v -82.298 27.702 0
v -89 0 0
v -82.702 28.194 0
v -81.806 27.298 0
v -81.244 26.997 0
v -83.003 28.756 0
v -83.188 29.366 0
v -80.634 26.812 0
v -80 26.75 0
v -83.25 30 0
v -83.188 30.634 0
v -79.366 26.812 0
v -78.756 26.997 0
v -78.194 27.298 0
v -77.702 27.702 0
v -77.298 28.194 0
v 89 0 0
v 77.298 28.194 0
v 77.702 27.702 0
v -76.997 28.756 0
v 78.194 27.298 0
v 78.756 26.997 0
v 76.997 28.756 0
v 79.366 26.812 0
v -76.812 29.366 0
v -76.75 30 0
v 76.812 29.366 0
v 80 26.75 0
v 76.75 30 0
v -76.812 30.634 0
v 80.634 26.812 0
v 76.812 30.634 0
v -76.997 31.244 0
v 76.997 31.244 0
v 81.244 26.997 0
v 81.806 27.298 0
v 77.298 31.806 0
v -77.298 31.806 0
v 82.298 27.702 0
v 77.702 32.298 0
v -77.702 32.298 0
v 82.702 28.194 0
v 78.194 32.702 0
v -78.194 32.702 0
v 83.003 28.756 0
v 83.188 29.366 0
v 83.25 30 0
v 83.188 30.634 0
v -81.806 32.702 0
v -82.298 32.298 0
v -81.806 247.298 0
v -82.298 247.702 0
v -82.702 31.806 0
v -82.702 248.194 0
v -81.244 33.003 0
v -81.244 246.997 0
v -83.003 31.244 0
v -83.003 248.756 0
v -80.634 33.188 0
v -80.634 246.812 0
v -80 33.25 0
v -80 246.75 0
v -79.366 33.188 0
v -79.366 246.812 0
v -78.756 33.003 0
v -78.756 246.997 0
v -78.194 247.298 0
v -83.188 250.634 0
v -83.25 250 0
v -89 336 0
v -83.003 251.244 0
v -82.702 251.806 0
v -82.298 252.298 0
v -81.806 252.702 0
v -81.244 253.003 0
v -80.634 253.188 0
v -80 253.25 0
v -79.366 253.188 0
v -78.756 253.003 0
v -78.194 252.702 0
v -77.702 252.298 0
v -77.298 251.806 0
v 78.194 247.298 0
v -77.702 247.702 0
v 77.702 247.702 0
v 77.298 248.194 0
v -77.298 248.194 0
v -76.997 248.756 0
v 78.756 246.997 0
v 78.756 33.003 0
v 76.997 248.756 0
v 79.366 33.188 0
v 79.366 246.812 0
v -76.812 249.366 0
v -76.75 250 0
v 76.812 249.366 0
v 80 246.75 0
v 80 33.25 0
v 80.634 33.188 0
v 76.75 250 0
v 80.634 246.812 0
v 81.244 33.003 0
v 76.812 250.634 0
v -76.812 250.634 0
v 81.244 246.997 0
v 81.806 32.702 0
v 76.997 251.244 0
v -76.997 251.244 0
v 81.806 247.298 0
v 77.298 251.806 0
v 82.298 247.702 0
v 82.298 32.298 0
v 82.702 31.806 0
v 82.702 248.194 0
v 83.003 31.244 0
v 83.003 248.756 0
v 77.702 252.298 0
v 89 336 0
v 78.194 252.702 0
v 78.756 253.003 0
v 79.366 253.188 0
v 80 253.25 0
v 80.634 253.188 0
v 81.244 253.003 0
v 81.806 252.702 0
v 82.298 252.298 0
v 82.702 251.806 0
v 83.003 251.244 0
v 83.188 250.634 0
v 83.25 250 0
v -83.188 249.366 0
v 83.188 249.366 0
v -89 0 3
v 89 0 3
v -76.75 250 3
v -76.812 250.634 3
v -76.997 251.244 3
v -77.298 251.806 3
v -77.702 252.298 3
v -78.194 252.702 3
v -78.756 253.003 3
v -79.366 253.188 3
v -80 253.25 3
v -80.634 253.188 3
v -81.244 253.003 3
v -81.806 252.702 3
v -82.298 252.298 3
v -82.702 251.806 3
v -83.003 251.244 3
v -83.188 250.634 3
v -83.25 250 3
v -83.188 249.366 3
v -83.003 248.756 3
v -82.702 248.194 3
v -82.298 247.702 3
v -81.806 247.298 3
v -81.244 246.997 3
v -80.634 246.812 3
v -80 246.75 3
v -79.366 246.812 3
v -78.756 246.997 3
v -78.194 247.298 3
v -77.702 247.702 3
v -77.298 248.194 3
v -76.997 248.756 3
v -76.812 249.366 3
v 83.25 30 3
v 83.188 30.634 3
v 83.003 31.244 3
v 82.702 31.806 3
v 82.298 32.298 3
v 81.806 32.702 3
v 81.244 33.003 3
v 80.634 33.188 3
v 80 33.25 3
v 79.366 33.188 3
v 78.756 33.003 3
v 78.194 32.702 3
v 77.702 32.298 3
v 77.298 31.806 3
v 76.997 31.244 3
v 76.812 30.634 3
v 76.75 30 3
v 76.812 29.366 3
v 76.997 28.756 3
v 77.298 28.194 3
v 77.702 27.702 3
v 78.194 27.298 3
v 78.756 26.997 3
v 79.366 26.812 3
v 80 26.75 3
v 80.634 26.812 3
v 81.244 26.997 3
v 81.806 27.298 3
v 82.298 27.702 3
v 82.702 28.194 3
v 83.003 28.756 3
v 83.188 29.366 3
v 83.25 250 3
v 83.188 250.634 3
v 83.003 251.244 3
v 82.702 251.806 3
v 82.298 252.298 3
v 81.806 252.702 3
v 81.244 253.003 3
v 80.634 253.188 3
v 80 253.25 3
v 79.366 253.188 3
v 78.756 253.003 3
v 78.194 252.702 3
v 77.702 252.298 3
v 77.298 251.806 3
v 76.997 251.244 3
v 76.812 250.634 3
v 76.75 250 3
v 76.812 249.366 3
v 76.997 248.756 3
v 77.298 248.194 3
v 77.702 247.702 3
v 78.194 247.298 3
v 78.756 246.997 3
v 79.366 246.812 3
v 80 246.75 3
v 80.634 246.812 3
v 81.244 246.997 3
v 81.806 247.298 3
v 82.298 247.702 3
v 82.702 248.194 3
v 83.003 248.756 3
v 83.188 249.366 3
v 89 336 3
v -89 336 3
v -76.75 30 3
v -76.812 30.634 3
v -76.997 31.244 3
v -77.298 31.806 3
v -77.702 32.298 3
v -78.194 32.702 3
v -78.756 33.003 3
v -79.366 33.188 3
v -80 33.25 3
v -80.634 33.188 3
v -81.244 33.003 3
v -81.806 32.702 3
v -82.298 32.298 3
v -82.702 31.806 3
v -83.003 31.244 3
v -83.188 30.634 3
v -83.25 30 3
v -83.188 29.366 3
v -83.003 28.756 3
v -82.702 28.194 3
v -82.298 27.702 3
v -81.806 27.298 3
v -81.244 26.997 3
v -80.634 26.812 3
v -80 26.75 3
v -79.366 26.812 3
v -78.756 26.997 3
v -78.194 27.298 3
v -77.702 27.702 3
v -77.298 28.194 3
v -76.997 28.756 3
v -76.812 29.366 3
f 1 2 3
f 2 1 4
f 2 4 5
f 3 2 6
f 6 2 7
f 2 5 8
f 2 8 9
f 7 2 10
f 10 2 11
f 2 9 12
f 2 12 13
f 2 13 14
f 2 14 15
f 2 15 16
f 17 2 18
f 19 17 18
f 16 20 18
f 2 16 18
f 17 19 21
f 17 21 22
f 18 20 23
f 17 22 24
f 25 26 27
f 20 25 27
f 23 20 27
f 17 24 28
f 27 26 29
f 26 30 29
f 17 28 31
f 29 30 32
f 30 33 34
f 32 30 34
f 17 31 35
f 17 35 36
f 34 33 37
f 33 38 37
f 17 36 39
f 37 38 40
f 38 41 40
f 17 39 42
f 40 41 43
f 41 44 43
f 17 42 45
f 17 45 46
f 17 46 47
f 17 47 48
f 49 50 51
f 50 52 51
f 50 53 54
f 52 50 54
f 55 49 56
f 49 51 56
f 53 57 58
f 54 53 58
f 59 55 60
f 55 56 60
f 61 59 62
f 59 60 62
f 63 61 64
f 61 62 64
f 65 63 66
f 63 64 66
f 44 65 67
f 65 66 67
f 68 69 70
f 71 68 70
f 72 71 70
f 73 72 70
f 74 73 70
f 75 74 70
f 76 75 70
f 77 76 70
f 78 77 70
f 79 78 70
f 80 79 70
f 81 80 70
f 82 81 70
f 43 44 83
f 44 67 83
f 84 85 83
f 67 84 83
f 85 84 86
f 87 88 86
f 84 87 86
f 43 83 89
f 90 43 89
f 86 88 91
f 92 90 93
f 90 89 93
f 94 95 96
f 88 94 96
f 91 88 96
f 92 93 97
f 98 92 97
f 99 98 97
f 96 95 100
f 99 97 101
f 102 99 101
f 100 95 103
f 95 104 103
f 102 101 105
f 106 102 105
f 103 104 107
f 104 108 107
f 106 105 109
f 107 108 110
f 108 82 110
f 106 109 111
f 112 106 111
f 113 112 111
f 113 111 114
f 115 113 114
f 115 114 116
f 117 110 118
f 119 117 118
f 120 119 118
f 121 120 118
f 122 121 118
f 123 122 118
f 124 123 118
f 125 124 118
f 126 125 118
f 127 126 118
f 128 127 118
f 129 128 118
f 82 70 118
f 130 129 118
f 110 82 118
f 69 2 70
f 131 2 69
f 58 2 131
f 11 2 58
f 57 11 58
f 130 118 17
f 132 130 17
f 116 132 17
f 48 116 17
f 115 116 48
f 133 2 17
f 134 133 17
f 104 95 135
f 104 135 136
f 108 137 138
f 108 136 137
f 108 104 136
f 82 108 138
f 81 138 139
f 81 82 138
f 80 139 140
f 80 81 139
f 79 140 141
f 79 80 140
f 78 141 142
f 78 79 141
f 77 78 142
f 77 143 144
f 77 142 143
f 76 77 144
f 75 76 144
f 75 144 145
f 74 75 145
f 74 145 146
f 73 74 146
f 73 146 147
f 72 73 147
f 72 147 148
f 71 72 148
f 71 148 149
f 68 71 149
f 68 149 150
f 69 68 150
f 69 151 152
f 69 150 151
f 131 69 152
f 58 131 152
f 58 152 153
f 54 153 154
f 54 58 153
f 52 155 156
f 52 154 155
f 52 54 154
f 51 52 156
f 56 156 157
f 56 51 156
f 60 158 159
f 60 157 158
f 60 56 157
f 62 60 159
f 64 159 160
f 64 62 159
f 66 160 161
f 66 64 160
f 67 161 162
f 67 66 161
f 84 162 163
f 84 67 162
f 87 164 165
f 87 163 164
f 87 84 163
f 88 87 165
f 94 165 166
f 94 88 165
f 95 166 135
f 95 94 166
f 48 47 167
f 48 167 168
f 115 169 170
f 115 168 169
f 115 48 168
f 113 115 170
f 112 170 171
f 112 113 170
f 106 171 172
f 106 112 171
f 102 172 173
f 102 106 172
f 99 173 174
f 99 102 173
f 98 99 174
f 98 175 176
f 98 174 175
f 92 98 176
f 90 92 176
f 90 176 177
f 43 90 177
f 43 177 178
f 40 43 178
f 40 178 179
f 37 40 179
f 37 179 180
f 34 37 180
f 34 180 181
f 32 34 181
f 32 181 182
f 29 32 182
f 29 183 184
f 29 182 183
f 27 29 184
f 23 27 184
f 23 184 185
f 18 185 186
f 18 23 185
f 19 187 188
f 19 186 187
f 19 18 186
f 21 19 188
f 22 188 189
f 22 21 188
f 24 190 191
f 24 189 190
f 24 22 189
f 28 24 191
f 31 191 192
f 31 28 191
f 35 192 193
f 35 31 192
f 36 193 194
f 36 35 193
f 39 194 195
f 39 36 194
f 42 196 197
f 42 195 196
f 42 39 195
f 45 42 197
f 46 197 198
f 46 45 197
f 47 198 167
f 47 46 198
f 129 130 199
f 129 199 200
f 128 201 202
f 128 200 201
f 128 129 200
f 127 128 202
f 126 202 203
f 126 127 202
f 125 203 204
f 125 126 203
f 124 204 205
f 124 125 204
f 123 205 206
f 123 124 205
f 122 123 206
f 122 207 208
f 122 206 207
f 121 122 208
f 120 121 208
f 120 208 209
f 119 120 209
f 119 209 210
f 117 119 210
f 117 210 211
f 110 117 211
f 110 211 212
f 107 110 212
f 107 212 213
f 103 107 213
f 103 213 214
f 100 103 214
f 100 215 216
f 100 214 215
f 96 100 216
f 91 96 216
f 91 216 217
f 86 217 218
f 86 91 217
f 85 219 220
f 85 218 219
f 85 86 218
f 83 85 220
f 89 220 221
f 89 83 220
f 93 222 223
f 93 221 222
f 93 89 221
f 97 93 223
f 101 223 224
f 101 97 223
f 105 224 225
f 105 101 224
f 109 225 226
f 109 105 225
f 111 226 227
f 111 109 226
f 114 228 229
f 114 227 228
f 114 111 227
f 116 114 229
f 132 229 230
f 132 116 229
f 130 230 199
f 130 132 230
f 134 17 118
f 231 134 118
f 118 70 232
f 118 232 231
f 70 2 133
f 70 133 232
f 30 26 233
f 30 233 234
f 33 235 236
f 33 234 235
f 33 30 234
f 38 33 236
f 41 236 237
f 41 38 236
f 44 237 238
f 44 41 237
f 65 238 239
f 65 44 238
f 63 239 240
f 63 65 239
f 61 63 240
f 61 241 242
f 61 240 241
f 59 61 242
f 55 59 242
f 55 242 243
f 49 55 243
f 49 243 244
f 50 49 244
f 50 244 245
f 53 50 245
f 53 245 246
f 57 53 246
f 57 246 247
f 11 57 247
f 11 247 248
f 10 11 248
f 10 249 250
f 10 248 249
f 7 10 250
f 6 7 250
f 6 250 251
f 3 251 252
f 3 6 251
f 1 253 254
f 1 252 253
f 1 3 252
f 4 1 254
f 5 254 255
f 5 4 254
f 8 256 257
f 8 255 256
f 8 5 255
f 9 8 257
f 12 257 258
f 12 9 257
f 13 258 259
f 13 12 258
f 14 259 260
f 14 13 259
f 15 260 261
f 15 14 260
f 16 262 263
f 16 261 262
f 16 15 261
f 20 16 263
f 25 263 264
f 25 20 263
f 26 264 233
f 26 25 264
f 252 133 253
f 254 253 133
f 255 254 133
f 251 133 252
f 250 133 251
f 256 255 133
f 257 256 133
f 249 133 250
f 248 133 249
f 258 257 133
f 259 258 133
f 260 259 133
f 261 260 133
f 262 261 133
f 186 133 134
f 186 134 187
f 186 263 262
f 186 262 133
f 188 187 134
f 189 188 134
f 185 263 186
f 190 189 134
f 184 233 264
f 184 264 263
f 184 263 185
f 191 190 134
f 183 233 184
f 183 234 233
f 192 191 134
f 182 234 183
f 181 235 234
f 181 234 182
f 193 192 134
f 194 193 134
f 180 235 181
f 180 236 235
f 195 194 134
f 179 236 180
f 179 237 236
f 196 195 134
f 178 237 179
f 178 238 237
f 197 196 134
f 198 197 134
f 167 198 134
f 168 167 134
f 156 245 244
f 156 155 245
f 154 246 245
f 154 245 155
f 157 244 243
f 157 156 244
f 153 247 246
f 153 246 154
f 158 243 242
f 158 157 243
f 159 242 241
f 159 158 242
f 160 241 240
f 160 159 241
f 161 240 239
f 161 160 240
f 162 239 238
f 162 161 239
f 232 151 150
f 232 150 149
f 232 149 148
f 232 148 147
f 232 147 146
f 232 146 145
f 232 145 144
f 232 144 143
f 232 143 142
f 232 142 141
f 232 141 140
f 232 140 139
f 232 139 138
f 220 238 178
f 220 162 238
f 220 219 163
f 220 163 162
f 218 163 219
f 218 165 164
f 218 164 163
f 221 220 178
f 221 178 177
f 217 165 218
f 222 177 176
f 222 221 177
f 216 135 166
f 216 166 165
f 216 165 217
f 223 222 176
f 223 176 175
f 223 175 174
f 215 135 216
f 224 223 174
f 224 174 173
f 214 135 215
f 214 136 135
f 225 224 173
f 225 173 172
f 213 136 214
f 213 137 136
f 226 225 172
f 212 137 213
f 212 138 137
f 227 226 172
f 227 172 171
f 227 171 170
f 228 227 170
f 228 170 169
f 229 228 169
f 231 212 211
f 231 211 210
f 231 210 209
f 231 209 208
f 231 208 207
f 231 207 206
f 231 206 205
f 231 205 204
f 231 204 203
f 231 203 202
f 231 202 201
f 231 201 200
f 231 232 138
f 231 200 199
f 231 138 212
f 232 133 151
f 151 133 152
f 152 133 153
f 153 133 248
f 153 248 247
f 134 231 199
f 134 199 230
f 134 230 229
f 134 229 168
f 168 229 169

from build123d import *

# Parameters (mm, degrees)
SKETCH1_W               = 178
SKETCH1_H               = 336
BOSS_EXTRUDE1_DEPTH     = 3
CUT_EXTRUDE1_DEPTH      = 348.600345224
CUT_EXTRUDE1_DEPTH_BACK = 348.600345224
SKETCH2_R               = 3.25


with BuildPart() as part:
    # Sketch1 → Boss-Extrude1 (new body)
    with BuildSketch(Plane.XY):
        with Locations((0, 168)):
            Rectangle(SKETCH1_W, SKETCH1_H)
    extrude(amount=BOSS_EXTRUDE1_DEPTH)

    # Sketch2 → Cut-Extrude1 (cut, two sides: drawn at the far end of the back side and taken through both)
    with BuildSketch(Plane.XY.offset(3).offset(-CUT_EXTRUDE1_DEPTH_BACK)):
        with Locations((-80, 250)):
            Circle(SKETCH2_R)
        with Locations((80, 250)):
            Circle(SKETCH2_R)
        with Locations((80, 30)):
            Circle(SKETCH2_R)
        with Locations((-80, 30)):
            Circle(SKETCH2_R)
    extrude(amount=CUT_EXTRUDE1_DEPTH + CUT_EXTRUDE1_DEPTH_BACK, mode=Mode.SUBTRACT)


solid = part.part
